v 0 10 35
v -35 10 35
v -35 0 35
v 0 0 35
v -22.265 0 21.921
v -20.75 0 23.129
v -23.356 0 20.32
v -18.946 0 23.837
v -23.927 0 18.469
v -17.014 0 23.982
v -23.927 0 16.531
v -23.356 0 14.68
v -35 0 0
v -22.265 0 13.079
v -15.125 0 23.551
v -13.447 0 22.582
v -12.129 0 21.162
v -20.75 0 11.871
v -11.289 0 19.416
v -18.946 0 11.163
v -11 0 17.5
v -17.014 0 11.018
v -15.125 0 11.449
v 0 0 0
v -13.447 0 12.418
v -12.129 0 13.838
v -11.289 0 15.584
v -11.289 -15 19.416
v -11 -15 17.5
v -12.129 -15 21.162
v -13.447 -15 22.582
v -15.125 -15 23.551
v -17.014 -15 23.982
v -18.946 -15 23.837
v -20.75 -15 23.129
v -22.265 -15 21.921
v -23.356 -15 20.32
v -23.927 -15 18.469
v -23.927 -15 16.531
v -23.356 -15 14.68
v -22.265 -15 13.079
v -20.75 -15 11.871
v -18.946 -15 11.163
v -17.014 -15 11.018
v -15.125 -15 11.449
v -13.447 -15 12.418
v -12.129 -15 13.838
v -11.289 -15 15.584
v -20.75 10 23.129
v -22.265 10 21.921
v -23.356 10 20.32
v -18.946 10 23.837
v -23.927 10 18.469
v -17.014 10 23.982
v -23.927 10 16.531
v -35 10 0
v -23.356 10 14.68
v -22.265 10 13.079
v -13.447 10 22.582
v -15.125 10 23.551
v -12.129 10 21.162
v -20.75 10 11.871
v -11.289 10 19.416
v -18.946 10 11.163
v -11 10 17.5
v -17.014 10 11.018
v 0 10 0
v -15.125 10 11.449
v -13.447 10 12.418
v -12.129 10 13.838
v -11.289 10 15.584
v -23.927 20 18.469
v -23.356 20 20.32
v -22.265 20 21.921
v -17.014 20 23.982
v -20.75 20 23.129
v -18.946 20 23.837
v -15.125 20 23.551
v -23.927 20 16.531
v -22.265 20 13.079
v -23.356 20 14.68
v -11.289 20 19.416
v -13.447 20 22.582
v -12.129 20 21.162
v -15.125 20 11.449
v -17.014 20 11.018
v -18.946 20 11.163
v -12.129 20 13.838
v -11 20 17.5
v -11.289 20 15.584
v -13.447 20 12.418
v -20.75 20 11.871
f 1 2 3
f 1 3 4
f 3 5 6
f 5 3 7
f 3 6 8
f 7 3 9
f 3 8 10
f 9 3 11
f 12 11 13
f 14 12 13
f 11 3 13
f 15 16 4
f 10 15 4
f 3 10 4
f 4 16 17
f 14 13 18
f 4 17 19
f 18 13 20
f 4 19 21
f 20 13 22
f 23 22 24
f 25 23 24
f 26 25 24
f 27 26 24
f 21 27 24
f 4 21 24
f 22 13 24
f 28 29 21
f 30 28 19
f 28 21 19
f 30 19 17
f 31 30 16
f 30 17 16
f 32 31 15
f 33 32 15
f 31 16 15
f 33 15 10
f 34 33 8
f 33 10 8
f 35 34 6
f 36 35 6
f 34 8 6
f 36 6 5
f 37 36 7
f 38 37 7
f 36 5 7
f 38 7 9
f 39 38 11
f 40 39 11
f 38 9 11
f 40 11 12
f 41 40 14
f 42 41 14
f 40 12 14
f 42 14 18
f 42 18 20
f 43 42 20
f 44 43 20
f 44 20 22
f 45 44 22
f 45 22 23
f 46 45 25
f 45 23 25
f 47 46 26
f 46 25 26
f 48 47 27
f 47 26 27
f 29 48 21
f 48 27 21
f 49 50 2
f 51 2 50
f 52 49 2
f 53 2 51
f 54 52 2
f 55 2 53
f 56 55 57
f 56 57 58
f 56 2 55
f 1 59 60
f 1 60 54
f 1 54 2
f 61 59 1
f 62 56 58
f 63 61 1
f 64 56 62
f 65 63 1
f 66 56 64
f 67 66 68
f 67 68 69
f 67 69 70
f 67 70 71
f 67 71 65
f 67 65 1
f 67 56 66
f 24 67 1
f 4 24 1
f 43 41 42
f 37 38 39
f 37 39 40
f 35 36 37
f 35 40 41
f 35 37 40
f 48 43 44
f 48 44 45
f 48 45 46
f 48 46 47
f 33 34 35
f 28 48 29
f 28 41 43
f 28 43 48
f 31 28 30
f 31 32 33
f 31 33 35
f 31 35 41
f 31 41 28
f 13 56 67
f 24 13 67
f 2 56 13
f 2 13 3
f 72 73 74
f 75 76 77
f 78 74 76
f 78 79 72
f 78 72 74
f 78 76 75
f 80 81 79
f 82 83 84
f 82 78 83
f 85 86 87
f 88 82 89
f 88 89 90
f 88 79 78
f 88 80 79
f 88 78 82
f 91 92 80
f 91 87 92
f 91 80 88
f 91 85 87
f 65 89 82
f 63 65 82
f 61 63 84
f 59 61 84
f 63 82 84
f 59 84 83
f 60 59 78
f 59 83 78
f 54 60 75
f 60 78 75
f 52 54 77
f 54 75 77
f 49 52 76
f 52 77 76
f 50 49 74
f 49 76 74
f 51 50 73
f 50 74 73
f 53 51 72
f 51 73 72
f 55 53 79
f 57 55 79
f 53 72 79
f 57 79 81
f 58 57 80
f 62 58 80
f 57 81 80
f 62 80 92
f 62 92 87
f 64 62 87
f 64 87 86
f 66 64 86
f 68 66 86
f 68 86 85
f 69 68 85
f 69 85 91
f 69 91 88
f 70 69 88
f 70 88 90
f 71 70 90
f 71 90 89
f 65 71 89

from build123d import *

# Parameters (mm, degrees)
F1_W     = 35
F1_H     = 20
F2_DEPTH = 30
F3_DEPTH = 5
F0_R     = 6.5
F6_DEPTH = 15
F7_DEPTH = 25
F8_DEPTH = 15
F9_DEPTH = 15


with BuildPart() as f2:
    # F1 (on Top) → F2 (new body)
    with BuildSketch(Plane.XY):
        with Locations((-17.5, 10)):
            Rectangle(F1_W, F1_H)
    extrude(amount=F2_DEPTH)

    # F3 (add): a face of the model
    f3_faces = [f2.faces().sort_by_distance(p)[0] for p in [
        (-17.5, 10, 30),
    ]]
    extrude(f3_faces, amount=F3_DEPTH)

    # F0 (on Front) → F6 (join)
    with BuildSketch(Plane.XZ):
        with Locations((-17.5, 17.5)):
            Circle(F0_R)
    extrude(amount=F6_DEPTH)

    # F7 (add): a face of the model
    f7_faces = [f2.faces().sort_by_distance(p)[0] for p in [
        (-34.5050252532, 0, 17.5),
    ]]
    extrude(f7_faces, amount=-F7_DEPTH)

    # F8 (add): a face of the model
    f8_faces = [f2.faces().sort_by_distance(p)[0] for p in [
        (-34.5050252532, 25, 17.5),
    ]]
    extrude(f8_faces, amount=-F8_DEPTH)

    # F9 (cut): a face of the model
    f9_faces = [f2.faces().sort_by_distance(p)[0] for p in [
        (-34.5050252532, 25, 17.5),
    ]]
    extrude(f9_faces, amount=-F9_DEPTH, mode=Mode.SUBTRACT)


solid = f2.part
